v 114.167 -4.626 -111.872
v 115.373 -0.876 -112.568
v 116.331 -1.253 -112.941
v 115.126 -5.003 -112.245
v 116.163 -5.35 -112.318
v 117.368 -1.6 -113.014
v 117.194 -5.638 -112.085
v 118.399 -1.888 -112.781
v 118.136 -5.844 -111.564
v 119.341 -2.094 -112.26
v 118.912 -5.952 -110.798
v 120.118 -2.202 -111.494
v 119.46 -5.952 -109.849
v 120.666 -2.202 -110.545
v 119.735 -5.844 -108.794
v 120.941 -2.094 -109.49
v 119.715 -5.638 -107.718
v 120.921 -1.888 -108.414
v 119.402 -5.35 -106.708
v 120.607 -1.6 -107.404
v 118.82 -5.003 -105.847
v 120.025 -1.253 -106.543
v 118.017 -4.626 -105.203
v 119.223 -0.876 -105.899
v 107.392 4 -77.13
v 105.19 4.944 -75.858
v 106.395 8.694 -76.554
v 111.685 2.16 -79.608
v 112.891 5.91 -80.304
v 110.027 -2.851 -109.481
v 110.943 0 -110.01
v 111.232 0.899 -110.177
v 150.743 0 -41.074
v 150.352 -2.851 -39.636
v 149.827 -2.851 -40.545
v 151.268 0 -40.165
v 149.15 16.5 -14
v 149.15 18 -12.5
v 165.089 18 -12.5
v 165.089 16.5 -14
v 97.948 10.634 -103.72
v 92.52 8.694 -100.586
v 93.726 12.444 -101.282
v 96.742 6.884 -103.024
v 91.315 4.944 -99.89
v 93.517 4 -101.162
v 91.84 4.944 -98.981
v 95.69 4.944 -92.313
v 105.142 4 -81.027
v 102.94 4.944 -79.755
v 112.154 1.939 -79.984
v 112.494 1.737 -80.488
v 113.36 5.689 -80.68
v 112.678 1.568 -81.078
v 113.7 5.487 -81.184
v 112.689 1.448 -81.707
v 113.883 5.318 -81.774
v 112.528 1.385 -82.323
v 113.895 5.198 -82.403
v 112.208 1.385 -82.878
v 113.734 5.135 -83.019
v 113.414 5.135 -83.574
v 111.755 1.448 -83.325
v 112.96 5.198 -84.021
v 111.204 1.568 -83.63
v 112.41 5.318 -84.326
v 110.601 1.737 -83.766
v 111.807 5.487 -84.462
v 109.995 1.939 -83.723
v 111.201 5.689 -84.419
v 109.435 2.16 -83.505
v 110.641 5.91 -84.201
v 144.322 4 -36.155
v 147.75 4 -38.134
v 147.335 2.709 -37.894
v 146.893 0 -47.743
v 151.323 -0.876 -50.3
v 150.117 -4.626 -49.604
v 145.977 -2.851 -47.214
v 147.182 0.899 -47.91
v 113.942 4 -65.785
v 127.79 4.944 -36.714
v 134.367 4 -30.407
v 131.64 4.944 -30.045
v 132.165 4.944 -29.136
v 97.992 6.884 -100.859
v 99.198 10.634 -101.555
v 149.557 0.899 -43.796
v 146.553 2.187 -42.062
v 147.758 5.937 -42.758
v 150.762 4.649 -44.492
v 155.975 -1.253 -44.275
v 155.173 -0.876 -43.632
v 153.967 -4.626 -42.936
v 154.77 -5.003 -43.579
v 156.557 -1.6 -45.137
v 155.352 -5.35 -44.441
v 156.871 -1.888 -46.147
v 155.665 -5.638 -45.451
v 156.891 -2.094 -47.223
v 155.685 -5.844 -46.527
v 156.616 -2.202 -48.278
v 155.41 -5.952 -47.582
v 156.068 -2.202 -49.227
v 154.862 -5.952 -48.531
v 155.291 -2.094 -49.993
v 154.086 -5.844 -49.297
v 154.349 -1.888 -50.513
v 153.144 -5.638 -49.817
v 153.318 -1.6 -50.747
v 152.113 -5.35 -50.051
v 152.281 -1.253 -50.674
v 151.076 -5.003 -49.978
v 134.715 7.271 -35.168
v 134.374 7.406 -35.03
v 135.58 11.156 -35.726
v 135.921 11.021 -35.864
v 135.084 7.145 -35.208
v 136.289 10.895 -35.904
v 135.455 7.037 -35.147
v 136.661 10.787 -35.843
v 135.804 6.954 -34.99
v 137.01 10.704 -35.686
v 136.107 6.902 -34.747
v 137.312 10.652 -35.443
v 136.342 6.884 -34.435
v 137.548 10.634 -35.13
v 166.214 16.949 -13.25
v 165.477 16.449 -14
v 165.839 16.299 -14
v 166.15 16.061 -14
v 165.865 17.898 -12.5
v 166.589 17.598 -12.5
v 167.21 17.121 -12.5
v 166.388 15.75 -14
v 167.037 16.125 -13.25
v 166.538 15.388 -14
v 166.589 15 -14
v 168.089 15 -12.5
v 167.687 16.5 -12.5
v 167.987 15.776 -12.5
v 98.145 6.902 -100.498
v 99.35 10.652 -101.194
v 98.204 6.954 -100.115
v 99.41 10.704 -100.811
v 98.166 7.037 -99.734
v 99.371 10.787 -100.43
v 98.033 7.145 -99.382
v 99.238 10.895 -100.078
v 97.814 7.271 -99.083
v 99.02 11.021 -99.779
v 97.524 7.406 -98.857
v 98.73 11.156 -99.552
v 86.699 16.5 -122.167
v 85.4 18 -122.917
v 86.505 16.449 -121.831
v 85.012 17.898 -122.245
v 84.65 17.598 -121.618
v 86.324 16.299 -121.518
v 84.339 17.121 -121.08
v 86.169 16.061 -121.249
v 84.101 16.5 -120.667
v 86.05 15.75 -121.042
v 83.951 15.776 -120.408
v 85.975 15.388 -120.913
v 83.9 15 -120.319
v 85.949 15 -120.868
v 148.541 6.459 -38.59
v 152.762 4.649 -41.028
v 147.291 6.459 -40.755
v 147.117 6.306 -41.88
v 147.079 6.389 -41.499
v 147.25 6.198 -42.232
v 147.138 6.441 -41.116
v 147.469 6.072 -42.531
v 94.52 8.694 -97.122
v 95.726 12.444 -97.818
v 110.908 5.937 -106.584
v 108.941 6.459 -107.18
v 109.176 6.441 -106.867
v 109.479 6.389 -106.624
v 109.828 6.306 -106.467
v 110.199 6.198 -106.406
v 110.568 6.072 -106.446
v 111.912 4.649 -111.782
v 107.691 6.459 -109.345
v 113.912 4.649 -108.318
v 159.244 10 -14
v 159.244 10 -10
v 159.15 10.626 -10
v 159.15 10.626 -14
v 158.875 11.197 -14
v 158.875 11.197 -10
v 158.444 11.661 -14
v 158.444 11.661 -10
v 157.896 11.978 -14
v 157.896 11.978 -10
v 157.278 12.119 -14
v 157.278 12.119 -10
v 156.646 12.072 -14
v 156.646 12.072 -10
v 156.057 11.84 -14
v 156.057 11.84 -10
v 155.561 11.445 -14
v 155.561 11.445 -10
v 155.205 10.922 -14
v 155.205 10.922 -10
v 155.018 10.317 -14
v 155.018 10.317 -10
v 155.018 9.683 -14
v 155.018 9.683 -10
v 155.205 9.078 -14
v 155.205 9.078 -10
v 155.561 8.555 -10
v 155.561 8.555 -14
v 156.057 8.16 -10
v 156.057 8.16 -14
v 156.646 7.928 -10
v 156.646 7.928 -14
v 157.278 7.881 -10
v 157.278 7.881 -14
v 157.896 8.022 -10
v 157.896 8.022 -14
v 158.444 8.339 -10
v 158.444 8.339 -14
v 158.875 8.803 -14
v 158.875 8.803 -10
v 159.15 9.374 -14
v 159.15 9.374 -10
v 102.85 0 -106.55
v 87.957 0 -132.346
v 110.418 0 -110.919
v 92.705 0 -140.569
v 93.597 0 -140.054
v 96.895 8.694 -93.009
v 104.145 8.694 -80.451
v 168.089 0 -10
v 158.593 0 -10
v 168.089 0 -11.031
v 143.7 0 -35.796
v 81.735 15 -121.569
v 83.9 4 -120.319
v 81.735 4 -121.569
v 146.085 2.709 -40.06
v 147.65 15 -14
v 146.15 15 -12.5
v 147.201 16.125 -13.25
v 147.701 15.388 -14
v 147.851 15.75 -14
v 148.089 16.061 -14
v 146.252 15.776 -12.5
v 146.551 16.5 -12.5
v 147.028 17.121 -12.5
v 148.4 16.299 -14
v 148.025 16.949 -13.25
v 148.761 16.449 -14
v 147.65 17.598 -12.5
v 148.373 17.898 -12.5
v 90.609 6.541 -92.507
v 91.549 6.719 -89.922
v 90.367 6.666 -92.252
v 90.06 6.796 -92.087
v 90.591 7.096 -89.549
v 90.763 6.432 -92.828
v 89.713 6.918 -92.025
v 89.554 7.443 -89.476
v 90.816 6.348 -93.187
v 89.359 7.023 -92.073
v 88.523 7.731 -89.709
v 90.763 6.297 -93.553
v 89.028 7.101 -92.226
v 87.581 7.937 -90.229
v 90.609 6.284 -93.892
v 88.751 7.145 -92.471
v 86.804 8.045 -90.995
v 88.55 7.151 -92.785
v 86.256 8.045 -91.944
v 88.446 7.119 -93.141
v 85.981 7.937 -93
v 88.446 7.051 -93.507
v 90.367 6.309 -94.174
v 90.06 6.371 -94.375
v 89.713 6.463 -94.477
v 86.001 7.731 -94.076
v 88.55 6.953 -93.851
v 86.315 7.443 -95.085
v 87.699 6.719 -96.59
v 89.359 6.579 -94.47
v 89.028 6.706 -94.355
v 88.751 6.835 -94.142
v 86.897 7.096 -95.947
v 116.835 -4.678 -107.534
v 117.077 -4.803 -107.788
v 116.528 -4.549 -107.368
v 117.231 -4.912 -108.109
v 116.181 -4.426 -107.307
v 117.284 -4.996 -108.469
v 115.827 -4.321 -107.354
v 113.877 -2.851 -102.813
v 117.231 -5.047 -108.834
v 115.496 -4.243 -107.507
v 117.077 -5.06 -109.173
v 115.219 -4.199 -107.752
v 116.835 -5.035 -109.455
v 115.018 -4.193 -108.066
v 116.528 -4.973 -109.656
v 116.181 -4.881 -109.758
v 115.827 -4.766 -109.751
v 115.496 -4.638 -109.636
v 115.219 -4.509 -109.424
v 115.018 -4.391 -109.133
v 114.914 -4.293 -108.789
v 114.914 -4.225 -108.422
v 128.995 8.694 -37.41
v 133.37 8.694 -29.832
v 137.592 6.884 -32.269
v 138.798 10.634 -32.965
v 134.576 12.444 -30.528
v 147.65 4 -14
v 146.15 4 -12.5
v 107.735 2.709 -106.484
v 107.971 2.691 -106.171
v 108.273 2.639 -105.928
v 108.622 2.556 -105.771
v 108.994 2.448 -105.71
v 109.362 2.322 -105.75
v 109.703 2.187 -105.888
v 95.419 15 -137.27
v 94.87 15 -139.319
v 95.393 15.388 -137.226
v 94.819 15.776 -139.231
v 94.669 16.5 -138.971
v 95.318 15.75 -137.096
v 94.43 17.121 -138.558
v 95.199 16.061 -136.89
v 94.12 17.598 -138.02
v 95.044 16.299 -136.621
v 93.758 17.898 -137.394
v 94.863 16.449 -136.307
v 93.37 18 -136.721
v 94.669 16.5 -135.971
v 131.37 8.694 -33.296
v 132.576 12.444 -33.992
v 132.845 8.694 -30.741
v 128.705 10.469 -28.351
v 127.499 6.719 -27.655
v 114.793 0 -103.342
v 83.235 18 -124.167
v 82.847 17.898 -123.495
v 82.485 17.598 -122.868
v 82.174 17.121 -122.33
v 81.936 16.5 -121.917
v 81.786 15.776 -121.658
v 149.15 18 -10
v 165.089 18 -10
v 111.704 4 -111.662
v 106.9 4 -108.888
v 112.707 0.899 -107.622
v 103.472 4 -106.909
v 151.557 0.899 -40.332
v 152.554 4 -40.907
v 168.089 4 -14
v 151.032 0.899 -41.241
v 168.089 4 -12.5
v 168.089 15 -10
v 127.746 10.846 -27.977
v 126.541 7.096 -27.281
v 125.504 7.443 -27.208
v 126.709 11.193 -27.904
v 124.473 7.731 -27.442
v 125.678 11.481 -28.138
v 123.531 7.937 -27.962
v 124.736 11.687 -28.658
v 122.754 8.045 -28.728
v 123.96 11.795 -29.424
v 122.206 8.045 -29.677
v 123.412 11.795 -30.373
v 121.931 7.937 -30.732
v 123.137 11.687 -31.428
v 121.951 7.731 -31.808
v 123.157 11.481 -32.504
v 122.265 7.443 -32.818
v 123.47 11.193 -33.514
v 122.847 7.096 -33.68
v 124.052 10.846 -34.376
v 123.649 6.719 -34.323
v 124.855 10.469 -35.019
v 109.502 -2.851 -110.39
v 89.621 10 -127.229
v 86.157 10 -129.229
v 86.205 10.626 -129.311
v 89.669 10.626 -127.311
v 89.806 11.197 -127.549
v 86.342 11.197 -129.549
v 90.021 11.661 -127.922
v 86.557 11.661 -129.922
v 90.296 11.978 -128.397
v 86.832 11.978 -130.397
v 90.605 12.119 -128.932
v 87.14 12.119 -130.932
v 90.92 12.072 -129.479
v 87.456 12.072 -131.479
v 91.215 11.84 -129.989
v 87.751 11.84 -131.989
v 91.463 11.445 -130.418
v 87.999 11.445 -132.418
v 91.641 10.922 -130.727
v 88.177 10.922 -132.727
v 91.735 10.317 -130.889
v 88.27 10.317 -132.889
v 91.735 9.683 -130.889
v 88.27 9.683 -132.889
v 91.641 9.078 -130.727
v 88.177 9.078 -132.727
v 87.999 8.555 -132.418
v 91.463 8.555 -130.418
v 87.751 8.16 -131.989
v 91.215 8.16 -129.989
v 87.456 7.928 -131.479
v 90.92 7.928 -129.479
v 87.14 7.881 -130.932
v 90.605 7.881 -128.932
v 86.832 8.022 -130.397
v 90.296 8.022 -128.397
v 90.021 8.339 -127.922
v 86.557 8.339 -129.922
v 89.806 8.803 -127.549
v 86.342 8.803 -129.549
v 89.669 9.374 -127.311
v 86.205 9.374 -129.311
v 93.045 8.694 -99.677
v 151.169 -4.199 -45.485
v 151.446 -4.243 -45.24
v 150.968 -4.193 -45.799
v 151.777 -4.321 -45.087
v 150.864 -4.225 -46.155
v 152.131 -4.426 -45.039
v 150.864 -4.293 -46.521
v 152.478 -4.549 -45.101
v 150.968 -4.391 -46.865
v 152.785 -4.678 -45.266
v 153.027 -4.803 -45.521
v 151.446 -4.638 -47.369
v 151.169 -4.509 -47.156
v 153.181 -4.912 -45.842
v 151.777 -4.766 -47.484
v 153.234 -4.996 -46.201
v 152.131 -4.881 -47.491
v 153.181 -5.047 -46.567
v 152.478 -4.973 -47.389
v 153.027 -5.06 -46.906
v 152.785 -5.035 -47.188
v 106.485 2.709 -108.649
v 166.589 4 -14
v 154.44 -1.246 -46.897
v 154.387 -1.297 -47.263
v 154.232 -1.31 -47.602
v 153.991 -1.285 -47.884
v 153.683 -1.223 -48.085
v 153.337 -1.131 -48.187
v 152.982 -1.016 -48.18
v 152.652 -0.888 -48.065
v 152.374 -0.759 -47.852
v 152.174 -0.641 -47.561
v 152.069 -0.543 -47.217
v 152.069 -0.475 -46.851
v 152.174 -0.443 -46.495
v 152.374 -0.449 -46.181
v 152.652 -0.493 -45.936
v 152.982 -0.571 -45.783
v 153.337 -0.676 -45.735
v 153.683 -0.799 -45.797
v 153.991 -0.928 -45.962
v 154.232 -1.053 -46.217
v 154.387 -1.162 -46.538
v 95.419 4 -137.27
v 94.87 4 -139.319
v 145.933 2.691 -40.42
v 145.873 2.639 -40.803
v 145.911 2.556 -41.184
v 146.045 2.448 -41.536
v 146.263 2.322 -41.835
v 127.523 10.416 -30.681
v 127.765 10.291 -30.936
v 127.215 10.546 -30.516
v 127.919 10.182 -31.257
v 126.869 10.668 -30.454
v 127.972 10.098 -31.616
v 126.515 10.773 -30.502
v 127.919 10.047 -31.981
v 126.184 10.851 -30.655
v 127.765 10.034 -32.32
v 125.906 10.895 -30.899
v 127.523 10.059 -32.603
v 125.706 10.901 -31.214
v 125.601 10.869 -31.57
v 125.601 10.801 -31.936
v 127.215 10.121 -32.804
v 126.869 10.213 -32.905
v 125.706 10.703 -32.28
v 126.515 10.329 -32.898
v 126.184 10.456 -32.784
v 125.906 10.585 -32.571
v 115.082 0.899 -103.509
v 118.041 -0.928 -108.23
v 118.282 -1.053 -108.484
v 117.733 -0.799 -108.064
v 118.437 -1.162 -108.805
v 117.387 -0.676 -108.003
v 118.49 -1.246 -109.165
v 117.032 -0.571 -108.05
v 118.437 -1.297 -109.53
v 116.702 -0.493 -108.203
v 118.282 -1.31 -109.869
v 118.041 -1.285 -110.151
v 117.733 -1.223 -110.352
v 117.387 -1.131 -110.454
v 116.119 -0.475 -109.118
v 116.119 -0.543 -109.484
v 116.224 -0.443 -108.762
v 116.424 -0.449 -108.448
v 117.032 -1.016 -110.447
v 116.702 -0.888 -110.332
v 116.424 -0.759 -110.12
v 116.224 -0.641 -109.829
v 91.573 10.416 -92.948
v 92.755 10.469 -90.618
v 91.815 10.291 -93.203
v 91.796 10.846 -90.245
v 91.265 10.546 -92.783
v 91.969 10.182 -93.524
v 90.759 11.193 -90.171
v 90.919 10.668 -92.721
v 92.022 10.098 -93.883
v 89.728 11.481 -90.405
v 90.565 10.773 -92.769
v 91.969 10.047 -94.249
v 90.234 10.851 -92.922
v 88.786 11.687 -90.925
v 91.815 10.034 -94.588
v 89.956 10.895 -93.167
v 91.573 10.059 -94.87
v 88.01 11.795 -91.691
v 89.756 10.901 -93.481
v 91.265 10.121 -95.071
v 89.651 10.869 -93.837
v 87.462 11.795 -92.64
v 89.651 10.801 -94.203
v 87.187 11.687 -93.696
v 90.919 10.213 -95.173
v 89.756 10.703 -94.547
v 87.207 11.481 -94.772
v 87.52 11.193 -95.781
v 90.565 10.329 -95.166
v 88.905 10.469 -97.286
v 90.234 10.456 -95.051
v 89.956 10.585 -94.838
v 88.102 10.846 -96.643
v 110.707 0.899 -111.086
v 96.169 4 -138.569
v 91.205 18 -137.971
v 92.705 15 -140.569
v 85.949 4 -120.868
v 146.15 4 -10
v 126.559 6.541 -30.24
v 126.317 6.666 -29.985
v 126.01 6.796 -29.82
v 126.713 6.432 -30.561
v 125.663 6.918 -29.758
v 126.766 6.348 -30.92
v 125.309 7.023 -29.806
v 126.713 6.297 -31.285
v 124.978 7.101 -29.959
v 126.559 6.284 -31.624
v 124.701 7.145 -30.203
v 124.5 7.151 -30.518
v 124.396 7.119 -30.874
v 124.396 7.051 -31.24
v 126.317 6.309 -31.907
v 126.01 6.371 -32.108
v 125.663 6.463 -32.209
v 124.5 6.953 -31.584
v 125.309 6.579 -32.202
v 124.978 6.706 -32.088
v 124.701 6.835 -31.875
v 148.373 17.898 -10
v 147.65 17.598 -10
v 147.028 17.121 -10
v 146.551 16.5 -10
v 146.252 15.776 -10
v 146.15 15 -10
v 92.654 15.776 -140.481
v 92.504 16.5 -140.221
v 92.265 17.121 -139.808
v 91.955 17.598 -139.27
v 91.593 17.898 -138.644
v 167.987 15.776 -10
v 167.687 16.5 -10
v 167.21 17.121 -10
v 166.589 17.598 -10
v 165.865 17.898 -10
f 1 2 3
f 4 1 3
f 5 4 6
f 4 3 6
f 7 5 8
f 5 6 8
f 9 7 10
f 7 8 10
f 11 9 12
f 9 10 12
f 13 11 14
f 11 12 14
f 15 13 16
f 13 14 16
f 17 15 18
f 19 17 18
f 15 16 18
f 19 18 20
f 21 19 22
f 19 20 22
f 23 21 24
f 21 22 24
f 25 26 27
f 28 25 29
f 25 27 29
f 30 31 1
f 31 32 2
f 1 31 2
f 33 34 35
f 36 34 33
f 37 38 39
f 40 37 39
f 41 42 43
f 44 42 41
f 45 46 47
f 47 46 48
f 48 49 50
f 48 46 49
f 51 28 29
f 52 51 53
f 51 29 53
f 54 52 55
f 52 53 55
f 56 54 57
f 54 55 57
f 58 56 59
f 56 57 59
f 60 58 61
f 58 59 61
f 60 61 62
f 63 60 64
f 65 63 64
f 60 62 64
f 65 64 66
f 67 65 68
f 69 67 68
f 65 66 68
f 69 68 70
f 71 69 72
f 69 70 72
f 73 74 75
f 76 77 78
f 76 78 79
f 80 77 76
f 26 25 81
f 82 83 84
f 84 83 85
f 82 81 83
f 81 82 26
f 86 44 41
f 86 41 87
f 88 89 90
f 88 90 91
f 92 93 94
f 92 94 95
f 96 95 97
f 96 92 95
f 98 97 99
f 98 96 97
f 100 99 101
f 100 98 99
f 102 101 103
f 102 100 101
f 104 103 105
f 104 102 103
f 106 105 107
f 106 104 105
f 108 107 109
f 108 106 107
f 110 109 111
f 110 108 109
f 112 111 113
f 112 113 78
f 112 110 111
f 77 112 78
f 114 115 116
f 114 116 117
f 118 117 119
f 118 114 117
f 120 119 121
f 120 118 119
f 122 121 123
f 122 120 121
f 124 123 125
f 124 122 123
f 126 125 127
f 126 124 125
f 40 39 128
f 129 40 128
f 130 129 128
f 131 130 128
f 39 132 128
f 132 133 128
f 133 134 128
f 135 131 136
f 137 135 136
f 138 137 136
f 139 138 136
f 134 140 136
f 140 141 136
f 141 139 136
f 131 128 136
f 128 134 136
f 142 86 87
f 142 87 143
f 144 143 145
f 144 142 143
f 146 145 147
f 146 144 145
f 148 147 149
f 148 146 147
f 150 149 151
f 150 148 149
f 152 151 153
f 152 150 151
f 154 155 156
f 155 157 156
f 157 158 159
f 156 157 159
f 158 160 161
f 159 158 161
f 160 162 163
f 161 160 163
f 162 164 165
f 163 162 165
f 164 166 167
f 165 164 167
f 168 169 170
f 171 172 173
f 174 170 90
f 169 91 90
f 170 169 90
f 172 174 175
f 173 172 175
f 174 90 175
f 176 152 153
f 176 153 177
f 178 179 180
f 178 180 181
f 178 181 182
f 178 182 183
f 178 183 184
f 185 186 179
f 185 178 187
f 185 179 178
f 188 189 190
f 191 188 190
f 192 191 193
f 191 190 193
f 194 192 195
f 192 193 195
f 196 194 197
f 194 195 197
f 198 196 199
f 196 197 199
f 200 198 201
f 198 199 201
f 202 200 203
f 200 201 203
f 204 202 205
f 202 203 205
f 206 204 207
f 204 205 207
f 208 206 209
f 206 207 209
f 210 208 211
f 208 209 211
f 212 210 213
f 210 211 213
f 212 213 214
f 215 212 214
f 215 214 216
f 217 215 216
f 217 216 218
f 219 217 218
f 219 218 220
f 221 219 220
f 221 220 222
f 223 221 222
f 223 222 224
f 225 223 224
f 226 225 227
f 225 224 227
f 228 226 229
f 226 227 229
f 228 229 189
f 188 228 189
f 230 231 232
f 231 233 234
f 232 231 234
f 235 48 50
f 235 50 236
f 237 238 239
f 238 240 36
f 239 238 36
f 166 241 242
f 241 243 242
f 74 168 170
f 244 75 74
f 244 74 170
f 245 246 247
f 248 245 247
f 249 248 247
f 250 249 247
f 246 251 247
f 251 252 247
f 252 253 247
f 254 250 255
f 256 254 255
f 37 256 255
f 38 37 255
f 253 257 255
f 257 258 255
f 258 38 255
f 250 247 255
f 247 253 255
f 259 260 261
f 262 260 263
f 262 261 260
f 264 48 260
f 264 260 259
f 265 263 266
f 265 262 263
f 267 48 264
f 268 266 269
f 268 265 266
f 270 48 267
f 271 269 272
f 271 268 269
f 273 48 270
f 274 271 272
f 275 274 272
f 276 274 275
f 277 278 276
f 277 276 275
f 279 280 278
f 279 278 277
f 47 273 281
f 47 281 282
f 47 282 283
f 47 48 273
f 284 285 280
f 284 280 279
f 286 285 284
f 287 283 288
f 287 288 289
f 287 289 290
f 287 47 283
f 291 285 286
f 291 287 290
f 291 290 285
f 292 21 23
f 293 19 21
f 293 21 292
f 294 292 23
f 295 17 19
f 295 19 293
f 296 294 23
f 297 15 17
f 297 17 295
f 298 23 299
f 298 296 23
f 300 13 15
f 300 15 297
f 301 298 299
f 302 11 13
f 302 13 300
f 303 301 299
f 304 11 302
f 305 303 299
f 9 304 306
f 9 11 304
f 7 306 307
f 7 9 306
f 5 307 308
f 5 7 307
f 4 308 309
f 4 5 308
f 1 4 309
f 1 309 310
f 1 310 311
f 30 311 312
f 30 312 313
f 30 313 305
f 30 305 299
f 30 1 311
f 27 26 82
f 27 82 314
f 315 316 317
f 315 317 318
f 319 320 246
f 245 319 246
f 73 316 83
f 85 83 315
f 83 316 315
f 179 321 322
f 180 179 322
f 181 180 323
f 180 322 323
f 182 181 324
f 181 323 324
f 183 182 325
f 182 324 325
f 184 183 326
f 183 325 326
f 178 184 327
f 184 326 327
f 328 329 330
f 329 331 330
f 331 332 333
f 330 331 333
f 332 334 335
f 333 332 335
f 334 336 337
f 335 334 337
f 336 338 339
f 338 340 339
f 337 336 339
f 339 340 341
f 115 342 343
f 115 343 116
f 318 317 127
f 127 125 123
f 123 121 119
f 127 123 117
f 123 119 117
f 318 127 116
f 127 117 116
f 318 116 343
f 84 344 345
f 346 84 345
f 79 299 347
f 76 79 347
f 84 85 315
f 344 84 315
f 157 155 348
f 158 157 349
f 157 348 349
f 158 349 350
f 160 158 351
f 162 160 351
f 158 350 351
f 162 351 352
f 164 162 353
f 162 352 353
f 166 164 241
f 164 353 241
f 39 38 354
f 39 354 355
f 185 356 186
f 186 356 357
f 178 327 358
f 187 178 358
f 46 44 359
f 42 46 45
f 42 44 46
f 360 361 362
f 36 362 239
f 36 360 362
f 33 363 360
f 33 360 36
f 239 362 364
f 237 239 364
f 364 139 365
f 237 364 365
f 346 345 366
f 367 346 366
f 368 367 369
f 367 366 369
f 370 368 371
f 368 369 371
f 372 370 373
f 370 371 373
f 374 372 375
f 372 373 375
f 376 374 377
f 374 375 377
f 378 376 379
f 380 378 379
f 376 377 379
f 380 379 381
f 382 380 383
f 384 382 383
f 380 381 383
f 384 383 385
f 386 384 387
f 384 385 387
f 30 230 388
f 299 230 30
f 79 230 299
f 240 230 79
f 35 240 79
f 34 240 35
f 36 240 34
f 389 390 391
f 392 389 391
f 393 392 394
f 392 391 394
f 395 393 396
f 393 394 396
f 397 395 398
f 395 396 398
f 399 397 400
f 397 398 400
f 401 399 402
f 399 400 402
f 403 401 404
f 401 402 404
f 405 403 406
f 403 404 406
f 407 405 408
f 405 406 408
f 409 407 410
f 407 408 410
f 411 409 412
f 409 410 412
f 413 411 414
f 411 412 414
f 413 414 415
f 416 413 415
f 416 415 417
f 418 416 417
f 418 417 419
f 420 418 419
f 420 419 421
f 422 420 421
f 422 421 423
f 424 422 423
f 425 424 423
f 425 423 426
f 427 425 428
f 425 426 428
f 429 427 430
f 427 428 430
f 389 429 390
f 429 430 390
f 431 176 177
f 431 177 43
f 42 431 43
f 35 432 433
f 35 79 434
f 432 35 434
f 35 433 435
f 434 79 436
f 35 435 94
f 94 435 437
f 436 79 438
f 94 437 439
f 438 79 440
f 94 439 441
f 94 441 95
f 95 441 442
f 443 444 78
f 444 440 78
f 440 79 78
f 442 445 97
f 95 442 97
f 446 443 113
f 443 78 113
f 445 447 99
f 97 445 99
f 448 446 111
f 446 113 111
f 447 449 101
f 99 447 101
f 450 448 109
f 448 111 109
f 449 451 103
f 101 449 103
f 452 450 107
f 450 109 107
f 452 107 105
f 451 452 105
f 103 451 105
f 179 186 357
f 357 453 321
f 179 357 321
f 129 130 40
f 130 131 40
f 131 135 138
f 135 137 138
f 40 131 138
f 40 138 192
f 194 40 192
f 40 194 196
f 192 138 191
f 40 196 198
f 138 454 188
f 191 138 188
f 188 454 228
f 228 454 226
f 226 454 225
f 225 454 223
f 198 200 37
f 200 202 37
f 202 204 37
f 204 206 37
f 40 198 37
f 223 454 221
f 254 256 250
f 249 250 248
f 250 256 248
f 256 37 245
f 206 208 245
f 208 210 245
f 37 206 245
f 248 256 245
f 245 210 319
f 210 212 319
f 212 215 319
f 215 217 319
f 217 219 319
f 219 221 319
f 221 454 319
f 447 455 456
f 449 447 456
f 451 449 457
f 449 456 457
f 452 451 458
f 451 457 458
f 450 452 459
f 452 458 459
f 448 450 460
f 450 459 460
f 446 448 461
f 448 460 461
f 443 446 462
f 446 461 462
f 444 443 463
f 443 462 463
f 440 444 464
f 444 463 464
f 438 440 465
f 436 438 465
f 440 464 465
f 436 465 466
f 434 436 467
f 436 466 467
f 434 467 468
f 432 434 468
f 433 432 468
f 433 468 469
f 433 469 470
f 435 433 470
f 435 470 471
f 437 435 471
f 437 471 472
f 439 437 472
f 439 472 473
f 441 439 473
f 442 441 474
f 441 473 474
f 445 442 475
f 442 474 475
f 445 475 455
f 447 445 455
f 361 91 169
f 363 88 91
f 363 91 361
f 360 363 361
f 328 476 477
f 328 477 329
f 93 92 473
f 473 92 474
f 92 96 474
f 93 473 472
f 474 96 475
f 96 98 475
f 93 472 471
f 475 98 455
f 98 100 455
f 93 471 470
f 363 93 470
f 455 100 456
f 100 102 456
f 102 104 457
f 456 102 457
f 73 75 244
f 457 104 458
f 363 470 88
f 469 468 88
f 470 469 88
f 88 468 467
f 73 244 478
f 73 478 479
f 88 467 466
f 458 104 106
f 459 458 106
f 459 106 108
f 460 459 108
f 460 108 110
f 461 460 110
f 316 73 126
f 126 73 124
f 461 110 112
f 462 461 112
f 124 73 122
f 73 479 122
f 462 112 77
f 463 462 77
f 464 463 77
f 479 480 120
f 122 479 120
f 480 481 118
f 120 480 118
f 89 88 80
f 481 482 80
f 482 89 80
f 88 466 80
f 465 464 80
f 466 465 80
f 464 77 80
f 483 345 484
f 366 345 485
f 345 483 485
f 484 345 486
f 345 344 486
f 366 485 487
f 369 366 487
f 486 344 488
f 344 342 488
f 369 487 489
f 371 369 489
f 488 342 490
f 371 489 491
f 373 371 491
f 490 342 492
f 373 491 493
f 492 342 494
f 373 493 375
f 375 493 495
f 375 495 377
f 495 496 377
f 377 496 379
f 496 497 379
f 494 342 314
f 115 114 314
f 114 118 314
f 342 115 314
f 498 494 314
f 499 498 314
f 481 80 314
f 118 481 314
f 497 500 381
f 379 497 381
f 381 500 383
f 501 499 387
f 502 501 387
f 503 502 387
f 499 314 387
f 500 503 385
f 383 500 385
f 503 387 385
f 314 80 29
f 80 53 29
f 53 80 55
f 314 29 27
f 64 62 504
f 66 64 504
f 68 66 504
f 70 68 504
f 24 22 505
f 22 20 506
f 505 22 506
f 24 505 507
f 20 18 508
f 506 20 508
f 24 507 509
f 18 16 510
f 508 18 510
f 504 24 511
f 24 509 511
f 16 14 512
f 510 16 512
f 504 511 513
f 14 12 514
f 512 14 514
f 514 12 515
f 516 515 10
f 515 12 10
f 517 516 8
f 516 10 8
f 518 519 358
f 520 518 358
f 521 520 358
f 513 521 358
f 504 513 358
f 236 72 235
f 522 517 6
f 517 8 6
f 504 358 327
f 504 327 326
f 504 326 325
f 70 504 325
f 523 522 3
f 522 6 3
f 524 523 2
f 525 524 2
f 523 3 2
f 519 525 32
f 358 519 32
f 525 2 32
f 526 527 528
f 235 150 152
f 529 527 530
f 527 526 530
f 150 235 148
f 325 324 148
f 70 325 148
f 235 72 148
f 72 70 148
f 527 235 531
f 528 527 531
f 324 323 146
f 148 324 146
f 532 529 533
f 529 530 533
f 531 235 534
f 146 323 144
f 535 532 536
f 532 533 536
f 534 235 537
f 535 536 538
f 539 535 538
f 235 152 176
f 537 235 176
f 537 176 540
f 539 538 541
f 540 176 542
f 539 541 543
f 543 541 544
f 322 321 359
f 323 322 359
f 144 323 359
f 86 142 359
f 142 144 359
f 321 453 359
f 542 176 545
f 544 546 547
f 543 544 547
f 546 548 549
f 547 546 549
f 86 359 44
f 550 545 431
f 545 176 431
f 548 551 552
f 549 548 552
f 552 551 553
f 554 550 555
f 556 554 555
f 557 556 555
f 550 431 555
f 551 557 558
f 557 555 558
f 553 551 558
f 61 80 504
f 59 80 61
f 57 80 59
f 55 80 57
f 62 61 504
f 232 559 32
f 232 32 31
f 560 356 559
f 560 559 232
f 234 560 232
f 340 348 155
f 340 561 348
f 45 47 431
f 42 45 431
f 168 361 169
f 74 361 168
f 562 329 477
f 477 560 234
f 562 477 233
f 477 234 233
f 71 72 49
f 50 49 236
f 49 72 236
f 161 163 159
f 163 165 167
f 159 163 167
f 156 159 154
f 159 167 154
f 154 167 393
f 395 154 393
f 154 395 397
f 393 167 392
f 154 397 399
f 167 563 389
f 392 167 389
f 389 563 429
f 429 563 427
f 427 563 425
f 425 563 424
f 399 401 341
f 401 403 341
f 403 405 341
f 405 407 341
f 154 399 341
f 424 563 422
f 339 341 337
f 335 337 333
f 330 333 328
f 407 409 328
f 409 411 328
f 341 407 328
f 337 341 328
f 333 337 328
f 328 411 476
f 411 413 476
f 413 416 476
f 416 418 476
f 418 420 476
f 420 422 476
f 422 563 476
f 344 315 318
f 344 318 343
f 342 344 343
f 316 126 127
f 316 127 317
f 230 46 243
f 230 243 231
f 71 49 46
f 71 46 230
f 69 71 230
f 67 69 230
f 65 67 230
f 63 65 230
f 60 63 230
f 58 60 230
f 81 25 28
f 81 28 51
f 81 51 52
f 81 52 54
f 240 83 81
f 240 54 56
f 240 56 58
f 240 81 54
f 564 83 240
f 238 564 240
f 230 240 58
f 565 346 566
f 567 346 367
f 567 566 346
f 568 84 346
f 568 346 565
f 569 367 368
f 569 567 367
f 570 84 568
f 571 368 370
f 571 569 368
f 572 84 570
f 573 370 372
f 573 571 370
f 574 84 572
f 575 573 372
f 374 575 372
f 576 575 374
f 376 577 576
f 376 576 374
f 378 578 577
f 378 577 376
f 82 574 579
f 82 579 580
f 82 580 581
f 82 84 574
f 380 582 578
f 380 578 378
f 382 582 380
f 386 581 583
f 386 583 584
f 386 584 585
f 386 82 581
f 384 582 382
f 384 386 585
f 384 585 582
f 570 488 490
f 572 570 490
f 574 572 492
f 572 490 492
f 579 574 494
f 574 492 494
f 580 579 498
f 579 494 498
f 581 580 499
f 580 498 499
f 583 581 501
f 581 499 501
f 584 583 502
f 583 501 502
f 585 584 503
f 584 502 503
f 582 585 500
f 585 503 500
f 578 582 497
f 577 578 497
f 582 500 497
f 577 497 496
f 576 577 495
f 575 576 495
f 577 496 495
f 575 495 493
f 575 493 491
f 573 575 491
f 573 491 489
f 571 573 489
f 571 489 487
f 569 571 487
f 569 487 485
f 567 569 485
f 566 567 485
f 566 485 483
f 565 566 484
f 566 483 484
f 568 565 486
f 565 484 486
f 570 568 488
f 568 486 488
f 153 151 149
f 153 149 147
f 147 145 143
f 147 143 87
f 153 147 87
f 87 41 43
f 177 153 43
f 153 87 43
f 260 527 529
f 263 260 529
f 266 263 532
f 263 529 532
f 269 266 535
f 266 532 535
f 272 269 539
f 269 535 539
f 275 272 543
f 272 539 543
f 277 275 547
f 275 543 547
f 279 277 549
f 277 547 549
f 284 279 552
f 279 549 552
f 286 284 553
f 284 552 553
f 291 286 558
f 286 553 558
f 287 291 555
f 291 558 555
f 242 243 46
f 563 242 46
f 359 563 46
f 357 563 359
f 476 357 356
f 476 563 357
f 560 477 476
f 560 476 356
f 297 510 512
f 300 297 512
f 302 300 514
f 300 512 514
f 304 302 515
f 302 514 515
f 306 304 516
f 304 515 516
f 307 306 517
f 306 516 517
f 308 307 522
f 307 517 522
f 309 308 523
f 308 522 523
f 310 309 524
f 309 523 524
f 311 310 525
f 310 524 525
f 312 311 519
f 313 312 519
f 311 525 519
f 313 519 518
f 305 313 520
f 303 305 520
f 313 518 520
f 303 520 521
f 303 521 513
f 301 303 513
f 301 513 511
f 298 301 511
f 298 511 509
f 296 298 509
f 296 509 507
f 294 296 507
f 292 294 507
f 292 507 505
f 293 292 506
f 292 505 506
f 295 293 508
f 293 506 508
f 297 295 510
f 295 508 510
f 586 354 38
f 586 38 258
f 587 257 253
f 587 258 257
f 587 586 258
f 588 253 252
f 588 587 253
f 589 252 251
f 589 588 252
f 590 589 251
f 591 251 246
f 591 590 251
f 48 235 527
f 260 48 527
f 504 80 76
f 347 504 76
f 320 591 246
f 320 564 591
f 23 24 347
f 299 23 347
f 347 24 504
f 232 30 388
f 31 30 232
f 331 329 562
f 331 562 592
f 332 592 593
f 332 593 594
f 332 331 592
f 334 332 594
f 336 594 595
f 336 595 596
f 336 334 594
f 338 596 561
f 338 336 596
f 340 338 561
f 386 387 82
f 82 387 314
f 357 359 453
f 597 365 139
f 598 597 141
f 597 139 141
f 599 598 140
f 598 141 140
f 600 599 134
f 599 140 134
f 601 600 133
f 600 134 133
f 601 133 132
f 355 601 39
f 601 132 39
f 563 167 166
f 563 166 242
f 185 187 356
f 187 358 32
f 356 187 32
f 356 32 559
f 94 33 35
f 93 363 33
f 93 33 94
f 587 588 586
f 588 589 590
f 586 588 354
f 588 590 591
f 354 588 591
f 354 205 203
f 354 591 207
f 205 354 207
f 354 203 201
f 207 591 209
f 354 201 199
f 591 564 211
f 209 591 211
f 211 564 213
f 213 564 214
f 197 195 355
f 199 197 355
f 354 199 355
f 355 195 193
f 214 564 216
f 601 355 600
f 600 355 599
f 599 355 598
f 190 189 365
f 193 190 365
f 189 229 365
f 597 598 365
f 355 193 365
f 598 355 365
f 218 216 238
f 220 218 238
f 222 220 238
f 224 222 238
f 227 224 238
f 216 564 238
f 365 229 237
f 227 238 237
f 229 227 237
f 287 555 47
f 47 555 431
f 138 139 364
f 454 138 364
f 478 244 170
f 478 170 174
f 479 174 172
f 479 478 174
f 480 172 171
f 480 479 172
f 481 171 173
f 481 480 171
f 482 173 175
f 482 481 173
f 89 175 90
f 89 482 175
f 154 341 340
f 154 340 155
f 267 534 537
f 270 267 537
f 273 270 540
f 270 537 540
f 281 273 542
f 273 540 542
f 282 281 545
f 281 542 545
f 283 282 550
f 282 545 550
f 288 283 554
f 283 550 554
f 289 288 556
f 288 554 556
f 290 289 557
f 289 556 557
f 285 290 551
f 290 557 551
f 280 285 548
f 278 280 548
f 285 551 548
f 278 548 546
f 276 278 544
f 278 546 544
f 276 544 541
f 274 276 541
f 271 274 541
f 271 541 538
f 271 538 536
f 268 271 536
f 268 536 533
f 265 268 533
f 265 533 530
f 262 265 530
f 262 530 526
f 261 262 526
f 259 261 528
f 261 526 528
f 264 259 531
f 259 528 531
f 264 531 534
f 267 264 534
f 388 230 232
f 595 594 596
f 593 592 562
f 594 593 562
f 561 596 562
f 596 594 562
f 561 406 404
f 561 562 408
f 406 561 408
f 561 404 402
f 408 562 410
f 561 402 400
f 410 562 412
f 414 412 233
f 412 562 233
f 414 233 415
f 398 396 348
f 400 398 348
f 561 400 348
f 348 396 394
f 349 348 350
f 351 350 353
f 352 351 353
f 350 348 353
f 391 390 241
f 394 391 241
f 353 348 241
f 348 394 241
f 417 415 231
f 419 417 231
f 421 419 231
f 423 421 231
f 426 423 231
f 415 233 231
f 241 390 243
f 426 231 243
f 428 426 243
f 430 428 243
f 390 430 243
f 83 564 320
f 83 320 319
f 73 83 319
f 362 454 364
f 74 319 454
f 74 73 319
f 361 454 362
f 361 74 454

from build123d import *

# Parameters (mm, degrees)
BOSS_EXTRUDE1_DEPTH      = 4
BOSS_EXTRUDE2_DEPTH      = 14
CUT_EXTRUDE3_DEPTH       = 15
CUT_EXTRUDE4_DEPTH       = 5
SKETCH7_R                = 2.125
CUT_EXTRUDE5_DEPTH       = 4
SKETCH8_R                = 2.125
CUT_EXTRUDE6_DEPTH       = 4
FILLET1_R                = 3
CHAMFER1_SIZE            = 1.5
BOSS_EXTRUDE3_DEPTH      = 40.85
BOSS_EXTRUDE3_DEPTH_BACK = 40.85
CUT_EXTRUDE7_DEPTH       = 76.384173958
CUT_EXTRUDE7_DEPTH_BACK  = 81.869001515
CUT_EXTRUDE8_DEPTH       = 3.3077
BOSS_EXTRUDE4_DEPTH      = 4
BOSS_EXTRUDE5_DEPTH      = 81.7
CUT_EXTRUDE9_DEPTH       = 30.834988393
SKETCH16_R               = 1.25
BOSS_EXTRUDE6_DEPTH      = 4
CUT_EXTRUDE10_DEPTH      = 35.534173958
CUT_EXTRUDE10_DEPTH_BACK = 122.719001515


with BuildPart() as part:
    # Sketch1 → Boss-Extrude1 (new body)
    with BuildSketch(Plane(origin=(0, 0, 0), x_dir=(1, 0, 0), z_dir=(0, 1, 0))):
        Polygon((81.735026919, 121.569219382), (146.149545762, 10), (170.398257068, 10), (93.859382572, 142.569219382), align=None)
    extrude(amount=BOSS_EXTRUDE1_DEPTH)

    # Sketch2 → Boss-Extrude2 (add)
    with BuildSketch(Plane(origin=(0, 4, 0), x_dir=(1, 0, 0), z_dir=(0, 1, 0))):
        Polygon((93.859382572, 142.569219382), (81.735026919, 121.569219382), (84.044427996, 117.569219382), (96.168783649, 138.569219382), align=None)
        Polygon((146.149545762, 10), (170.398257068, 10), (168.088855991, 14), (143.840144685, 14), align=None)
    extrude(amount=BOSS_EXTRUDE2_DEPTH)

    # Sketch5 → Cut-Extrude3 (cut, through all)
    with BuildSketch(Plane(origin=(0, 4, 0), x_dir=(1, 0, 0), z_dir=(0, 1, 0))):
        Polygon((96.168783649, 138.569219382), (92.704682034, 140.569219382), (93.859382572, 142.569219382), align=None)
        Polygon((81.735026919, 121.569219382), (85.199128534, 119.569219382), (84.044427996, 117.569219382), align=None)
        Polygon((146.149545762, 10), (146.149545762, 14), (143.840144685, 14), align=None)
        Polygon((168.088855991, 14), (168.088855991, 10), (170.398257068, 10), align=None)
    extrude(amount=CUT_EXTRUDE3_DEPTH, mode=Mode.SUBTRACT)

    # Sketch6 → Cut-Extrude4 (cut, through all)
    with BuildSketch(Plane(origin=(0, 4, 0), x_dir=(1, 0, 0), z_dir=(0, 1, 0))):
        Polygon((93.859382572, 142.569219382), (96.168783649, 138.569219382), (92.704682034, 140.569219382), align=None)
        Polygon((168.088855991, 14), (168.088855991, 10), (170.398257068, 10), align=None)
    extrude(amount=-CUT_EXTRUDE4_DEPTH, mode=Mode.SUBTRACT)

    # Sketch7 → Cut-Extrude5 (cut)
    with BuildSketch(Plane.XY.offset(-10)):
        with Locations((157.119200877, 10)):
            Circle(SKETCH7_R)
    extrude(amount=-CUT_EXTRUDE5_DEPTH, mode=Mode.SUBTRACT)

    # Sketch8 → Cut-Extrude6 (cut)
    with BuildSketch(Plane(origin=(8.660254038, 0, 5), x_dir=(-0.5, 0, 0.866025404), z_dir=(-0.866025404, 0, -0.5))):
        with Locations((-157.119200877, 10)):
            Circle(SKETCH8_R)
    extrude(amount=-CUT_EXTRUDE6_DEPTH, mode=Mode.SUBTRACT)

    # Fillet1
    fillet1_edges = [part.edges().sort_by_distance(p)[0] for p in [
        (94.436732841, 18, -139.569219382),
        (83.467077727, 18, -120.569219382),
        (146.149545762, 18, -12),
        (168.088855991, 18, -12),
    ]]
    fillet(fillet1_edges, radius=FILLET1_R)

    # Chamfer1
    chamfer1_edges = [part.edges().sort_by_distance(p)[0] for p in [
        (96.168783649, 9.5, -138.569219382),
        (85.199128534, 9.5, -119.569219382),
        (90.683956091, 18, -129.069219382),
        (85.638468362, 17.121320344, -120.330178286),
        (95.72944382, 17.121320344, -137.808260477),
        (146.149545762, 9.5, -14),
        (157.119200877, 18, -14),
        (168.088855991, 9.5, -14),
        (167.210176335, 17.121320344, -14),
        (147.028225419, 17.121320344, -14),
    ]]
    chamfer(chamfer1_edges, length=CHAMFER1_SIZE)

    # Sketch10 → Boss-Extrude3 (add, two sides)
    with BuildSketch(Plane(origin=(0, 0, 0), x_dir=(0.866025404, 0, -0.5), z_dir=(0.5, 0, 0.866025404))) as boss_extrude3_sk:
        Polygon((152.569219382, 4), (131.569219382, 4), (129.026250632, 4.943910052), (131.569219382, 11.794870108), align=None)
    extrude(amount=BOSS_EXTRUDE3_DEPTH)
    extrude(boss_extrude3_sk.sketch, amount=-BOSS_EXTRUDE3_DEPTH_BACK)

    # Sketch11 → Cut-Extrude7 (cut, two sides)
    with BuildSketch(Plane(origin=(0, 0, 0), x_dir=(0.866025404, 0, -0.5), z_dir=(0.5, 0, 0.866025404))) as cut_extrude7_sk:
        Polygon((152.569219382, 4), (151.084482218, 0), (152.569219382, 0), align=None)
    extrude(amount=CUT_EXTRUDE7_DEPTH, mode=Mode.SUBTRACT)
    extrude(cut_extrude7_sk.sketch, amount=-CUT_EXTRUDE7_DEPTH_BACK, mode=Mode.SUBTRACT)

    # Sketch12 → Cut-Extrude8 (cut)
    with BuildSketch(Plane(origin=(17.130089599, 53.289226321, -9.890061841), x_dir=(0.953509144, -0.29630427, 0.054991745), z_dir=(0.301364086, 0.9375, -0.173992636))):
        Polygon((80.111656223, 97.310988855), (99.184922165, 109.057074429), (142.026671782, 39.490742847), (122.95340584, 27.744657273), align=None)
    extrude(amount=-CUT_EXTRUDE8_DEPTH, mode=Mode.SUBTRACT)

    # Sketch14 → Boss-Extrude4 (add)
    with BuildSketch(Plane(origin=(16.13326761, 50.188257571, -9.314546398), x_dir=(0.953509144, -0.29630427, 0.054991745), z_dir=(0.301364086, 0.9375, -0.173992636))):
        with BuildLine():
            Line((80.111656223, 97.310988855), (84.539378674, 100.037758721))
            Line((84.539378674, 100.037758721), (85.850325725, 97.909046004))
            ThreePointArc((85.850325725, 97.909046004), (86.032422143, 96.775529185), (85.359666325, 95.845250143))
            Line((85.359666325, 95.845250143), (82.209171505, 93.905048508))
            Line((82.209171505, 93.905048508), (80.111656223, 97.310988855))
        make_face()
        with BuildLine():
            Line((99.184922165, 109.057074429), (94.757199714, 106.330304564))
            Line((94.757199714, 106.330304564), (96.068146765, 104.201591847))
            ThreePointArc((96.068146765, 104.201591847), (96.998425806, 103.52883603), (98.131942626, 103.710932448))
            Line((98.131942626, 103.710932448), (101.282437446, 105.651134083))
            Line((101.282437446, 105.651134083), (99.184922165, 109.057074429))
        make_face()
        with BuildLine():
            Line((122.95340584, 27.744657273), (120.855890559, 31.15059762))
            Line((120.855890559, 31.15059762), (124.00638538, 33.090799255))
            ThreePointArc((124.00638538, 33.090799255), (125.139902199, 33.272895673), (126.07018124, 32.600139855))
            Line((126.07018124, 32.600139855), (127.381128291, 30.471427139))
            Line((127.381128291, 30.471427139), (122.95340584, 27.744657273))
        make_face()
        with BuildLine():
            Line((142.026671782, 39.490742847), (137.598949331, 36.763972982))
            Line((137.598949331, 36.763972982), (136.28800228, 38.892685699))
            ThreePointArc((136.28800228, 38.892685699), (136.105905862, 40.026202518), (136.77866168, 40.956481559))
            Line((136.77866168, 40.956481559), (139.929156501, 42.896683194))
            Line((139.929156501, 42.896683194), (142.026671782, 39.490742847))
        make_face()
    extrude(amount=BOSS_EXTRUDE4_DEPTH)

    # Sketch15 → Boss-Extrude5 (add)
    with BuildSketch(Plane(origin=(20.425, 0, 35.377137745), x_dir=(0.866025404, 0, -0.5), z_dir=(0.5, 0, 0.866025404))):
        Polygon((129.026250632, 4.943910052), (150.026250632, -2.850960056), (151.084482218, 0), align=None)
    extrude(amount=-BOSS_EXTRUDE5_DEPTH)

    # Sketch13 → Cut-Extrude9 (cut, through all)
    with BuildSketch(Plane(origin=(16.13326761, 50.188257571, -9.314546398), x_dir=(0.953509144, -0.29630427, 0.054991745), z_dir=(0.301364086, 0.9375, -0.173992636))):
        with BuildLine():
            Line((94.663168486, 73.6822777), (101.47504918, 77.877308262))
            ThreePointArc((101.47504918, 77.877308262), (102.211038279, 80.973002053), (99.115344488, 81.708991152))
            Line((99.115344488, 81.708991152), (92.303463795, 77.51396059))
            Line((92.303463795, 77.51396059), (94.663168486, 73.6822777))
        make_face()
    extrude(amount=-CUT_EXTRUDE9_DEPTH, mode=Mode.SUBTRACT)

    # Sketch16 → Boss-Extrude6 (add)
    with BuildSketch(Plane(origin=(16.13326761, 50.188257571, -9.314546398), x_dir=(0.953509144, -0.29630427, 0.054991745), z_dir=(0.301364086, 0.9375, -0.173992636))):
        with BuildLine():
            Line((99.735519926, 108.163015088), (104.078093869, 110.837347072))
            ThreePointArc((104.078093869, 110.837347072), (109.37516991, 109.577987946), (108.115810785, 104.280911904))
            Line((108.115810785, 104.280911904), (103.773236843, 101.606579921))
            Line((103.773236843, 101.606579921), (99.735519926, 108.163015088))
        make_face()
        with Locations((106.096952327, 107.559129488)):
            Circle(SKETCH16_R, mode=Mode.SUBTRACT)
        with BuildLine():
            Line((76.319680043, 93.742597531), (80.662253985, 96.416929514))
            Line((80.662253985, 96.416929514), (84.699970901, 89.860494347))
            Line((84.699970901, 89.860494347), (80.357396959, 87.186162363))
            ThreePointArc((80.357396959, 87.186162363), (75.060320917, 88.445521489), (76.319680043, 93.742597531))
        make_face()
        with Locations((78.338538501, 90.464379947)):
            Circle(SKETCH16_R, mode=Mode.SUBTRACT)
        with BuildLine():
            Line((141.47607402, 40.384802188), (145.818647962, 43.059134172))
            ThreePointArc((145.818647962, 43.059134172), (147.078007088, 48.356210213), (141.780931046, 49.615569339))
            Line((141.780931046, 49.615569339), (137.438357104, 46.941237356))
            Line((137.438357104, 46.941237356), (141.47607402, 40.384802188))
        make_face()
        with Locations((143.799789504, 46.337351755)):
            Circle(SKETCH16_R, mode=Mode.SUBTRACT)
        with BuildLine():
            Line((118.365091163, 35.195151782), (122.402808079, 28.638716614))
            Line((122.402808079, 28.638716614), (118.060234137, 25.964384631))
            ThreePointArc((118.060234137, 25.964384631), (112.763158095, 27.223743756), (114.02251722, 32.520819798))
            Line((114.02251722, 32.520819798), (118.365091163, 35.195151782))
        make_face()
        with Locations((116.041375678, 29.242602214)):
            Circle(SKETCH16_R, mode=Mode.SUBTRACT)
    extrude(amount=-BOSS_EXTRUDE6_DEPTH)

    # Sketch18 → Cut-Extrude10 (cut, two sides)
    with BuildSketch(Plane(origin=(20.425, 0, 35.377137745), x_dir=(0.866025404, 0, -0.5), z_dir=(0.5, 0, 0.866025404))) as cut_extrude10_sk:
        Polygon((131.569219382, 4), (142.345537503, 0), (131.569219382, 0), align=None)
    extrude(amount=CUT_EXTRUDE10_DEPTH, mode=Mode.SUBTRACT)
    extrude(cut_extrude10_sk.sketch, amount=-CUT_EXTRUDE10_DEPTH_BACK, mode=Mode.SUBTRACT)


solid = part.part
